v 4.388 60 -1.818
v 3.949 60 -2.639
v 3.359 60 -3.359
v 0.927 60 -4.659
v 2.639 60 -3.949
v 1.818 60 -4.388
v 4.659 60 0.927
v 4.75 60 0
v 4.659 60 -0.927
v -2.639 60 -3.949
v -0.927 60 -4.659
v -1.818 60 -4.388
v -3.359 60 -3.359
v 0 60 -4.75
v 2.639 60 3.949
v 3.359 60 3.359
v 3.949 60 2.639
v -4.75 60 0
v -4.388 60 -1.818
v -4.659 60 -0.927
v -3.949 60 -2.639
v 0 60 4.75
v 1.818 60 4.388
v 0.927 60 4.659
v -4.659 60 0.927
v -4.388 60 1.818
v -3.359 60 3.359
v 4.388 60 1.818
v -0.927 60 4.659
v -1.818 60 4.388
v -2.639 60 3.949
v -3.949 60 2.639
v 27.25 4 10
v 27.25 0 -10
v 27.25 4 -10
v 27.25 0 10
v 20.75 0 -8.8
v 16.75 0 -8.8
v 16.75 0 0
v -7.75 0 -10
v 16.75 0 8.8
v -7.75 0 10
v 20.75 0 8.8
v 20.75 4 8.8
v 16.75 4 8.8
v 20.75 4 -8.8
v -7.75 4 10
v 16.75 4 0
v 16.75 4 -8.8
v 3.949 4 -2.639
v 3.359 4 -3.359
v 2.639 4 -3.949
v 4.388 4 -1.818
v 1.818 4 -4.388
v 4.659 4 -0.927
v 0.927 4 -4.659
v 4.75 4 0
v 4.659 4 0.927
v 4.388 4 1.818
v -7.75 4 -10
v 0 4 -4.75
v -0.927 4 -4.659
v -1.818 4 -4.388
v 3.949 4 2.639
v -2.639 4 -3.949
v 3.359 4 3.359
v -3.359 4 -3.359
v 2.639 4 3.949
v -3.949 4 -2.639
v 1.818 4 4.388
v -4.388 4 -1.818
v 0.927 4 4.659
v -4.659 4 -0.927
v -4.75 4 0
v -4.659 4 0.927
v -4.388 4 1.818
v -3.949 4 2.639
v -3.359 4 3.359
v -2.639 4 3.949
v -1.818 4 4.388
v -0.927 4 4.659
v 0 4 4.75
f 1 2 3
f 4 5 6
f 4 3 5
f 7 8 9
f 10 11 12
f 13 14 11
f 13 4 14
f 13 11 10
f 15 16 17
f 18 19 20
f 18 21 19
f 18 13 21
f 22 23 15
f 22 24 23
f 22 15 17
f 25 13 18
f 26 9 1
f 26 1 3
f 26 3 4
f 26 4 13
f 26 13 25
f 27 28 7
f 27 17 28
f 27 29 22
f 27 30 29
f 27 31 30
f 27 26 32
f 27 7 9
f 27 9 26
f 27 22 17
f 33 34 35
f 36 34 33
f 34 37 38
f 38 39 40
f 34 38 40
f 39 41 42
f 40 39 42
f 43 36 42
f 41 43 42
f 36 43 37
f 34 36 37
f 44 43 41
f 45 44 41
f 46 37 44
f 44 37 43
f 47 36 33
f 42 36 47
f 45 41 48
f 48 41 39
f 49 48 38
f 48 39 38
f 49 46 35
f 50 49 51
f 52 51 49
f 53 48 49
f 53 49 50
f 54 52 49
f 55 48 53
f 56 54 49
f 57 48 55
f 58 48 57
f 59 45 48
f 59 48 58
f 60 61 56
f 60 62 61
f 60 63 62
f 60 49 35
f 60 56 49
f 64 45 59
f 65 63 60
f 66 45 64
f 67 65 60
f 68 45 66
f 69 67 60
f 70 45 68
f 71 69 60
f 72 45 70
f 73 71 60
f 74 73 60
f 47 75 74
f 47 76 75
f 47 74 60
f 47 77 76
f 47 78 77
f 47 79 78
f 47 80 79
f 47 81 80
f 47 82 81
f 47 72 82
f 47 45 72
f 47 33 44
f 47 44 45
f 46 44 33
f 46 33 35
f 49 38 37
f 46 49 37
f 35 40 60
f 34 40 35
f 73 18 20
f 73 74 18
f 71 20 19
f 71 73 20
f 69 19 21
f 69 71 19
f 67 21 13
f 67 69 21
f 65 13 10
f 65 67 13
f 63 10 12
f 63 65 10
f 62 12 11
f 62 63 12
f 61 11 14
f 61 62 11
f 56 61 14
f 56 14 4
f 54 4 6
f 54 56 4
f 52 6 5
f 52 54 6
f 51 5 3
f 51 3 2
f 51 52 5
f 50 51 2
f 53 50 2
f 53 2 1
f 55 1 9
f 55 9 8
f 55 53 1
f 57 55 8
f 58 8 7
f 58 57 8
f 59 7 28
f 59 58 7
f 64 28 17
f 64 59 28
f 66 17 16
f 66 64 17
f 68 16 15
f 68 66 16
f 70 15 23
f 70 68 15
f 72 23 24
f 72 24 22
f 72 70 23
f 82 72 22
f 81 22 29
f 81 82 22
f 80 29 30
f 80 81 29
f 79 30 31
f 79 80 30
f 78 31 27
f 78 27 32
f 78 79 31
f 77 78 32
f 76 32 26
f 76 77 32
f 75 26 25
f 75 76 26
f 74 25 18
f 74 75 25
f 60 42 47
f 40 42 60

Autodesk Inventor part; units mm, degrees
ref_plane "YZ Plane" through (0, 0, 0) normal (1, 0, 0) x (0, 1, 0)
ref_plane "XZ Plane" through (0, 0, 0) normal (0, 1, 0) x (-1, 0, 0)
ref_plane "XY Plane" through (0, 0, 0) normal (0, 0, 1) x (1, 0, 0)
sketch "Sketch1" plane through (0, 0, 0) normal (0, 1, 0) x (-1, 0, 0)
  circle A0 centre (0, 0) radius 4.75
  line L0 (7.75, 0) -> (7.75, -10)
  line L1 (7.75, -10) -> (-27.25, -10)
  line L2 (-27.25, -10) -> (-27.25, 10)
  line L3 (-27.25, 10) -> (7.75, 10)
  line L4 (7.75, 10) -> (7.75, 0)
  line L5 (-4.75, 0) -> (-16.75, 0)
  line L6 (-16.75, -10) -> (-16.75, -8.8)
  line L7 (-16.75, 10) -> (-16.75, 8.8)
  line L8 (-16.75, 8.8) -> (-16.75, -8.8)
  line L9 (-16.75, -8.8) -> (-20.75, -8.8)
  line L10 (-20.75, -8.8) -> (-20.75, 8.8)
  line L11 (-20.75, 8.8) -> (-16.75, 8.8)
  line L12 (-20.75, -8.8) -> (-20.75, -10)
  line L13 (-20.75, 8.8) -> (-20.75, 10)
  dimension "d0" = 9.5
  dimension "d2" = 10
  dimension "d3" = 35
  dimension "d4" = 20
  dimension "d5" = 12
  dimension "d6" = 1.2
  dimension "d7" = 1.2
  dimension "d8" = 4
extrude "Extrusion1" add sketch "Sketch1" along normal blind 60 contours A0
extrude "Extrusion2" add sketch "Sketch1" along normal blind 4 contours L8 L7 L3 L4 L0 L1 L6
extrude "Extrusion3" add sketch "Sketch1" along normal blind 4 contours L6 L1 L12 L9
extrude "Extrusion4" add sketch "Sketch1" along normal blind 4 contours L11 L13 L3 L7
extrude "Extrusion5" add sketch "Sketch1" along normal blind 4 contours L10 L12 L1 L2 L3 L13
properties part number "Bluetooth__Base"
